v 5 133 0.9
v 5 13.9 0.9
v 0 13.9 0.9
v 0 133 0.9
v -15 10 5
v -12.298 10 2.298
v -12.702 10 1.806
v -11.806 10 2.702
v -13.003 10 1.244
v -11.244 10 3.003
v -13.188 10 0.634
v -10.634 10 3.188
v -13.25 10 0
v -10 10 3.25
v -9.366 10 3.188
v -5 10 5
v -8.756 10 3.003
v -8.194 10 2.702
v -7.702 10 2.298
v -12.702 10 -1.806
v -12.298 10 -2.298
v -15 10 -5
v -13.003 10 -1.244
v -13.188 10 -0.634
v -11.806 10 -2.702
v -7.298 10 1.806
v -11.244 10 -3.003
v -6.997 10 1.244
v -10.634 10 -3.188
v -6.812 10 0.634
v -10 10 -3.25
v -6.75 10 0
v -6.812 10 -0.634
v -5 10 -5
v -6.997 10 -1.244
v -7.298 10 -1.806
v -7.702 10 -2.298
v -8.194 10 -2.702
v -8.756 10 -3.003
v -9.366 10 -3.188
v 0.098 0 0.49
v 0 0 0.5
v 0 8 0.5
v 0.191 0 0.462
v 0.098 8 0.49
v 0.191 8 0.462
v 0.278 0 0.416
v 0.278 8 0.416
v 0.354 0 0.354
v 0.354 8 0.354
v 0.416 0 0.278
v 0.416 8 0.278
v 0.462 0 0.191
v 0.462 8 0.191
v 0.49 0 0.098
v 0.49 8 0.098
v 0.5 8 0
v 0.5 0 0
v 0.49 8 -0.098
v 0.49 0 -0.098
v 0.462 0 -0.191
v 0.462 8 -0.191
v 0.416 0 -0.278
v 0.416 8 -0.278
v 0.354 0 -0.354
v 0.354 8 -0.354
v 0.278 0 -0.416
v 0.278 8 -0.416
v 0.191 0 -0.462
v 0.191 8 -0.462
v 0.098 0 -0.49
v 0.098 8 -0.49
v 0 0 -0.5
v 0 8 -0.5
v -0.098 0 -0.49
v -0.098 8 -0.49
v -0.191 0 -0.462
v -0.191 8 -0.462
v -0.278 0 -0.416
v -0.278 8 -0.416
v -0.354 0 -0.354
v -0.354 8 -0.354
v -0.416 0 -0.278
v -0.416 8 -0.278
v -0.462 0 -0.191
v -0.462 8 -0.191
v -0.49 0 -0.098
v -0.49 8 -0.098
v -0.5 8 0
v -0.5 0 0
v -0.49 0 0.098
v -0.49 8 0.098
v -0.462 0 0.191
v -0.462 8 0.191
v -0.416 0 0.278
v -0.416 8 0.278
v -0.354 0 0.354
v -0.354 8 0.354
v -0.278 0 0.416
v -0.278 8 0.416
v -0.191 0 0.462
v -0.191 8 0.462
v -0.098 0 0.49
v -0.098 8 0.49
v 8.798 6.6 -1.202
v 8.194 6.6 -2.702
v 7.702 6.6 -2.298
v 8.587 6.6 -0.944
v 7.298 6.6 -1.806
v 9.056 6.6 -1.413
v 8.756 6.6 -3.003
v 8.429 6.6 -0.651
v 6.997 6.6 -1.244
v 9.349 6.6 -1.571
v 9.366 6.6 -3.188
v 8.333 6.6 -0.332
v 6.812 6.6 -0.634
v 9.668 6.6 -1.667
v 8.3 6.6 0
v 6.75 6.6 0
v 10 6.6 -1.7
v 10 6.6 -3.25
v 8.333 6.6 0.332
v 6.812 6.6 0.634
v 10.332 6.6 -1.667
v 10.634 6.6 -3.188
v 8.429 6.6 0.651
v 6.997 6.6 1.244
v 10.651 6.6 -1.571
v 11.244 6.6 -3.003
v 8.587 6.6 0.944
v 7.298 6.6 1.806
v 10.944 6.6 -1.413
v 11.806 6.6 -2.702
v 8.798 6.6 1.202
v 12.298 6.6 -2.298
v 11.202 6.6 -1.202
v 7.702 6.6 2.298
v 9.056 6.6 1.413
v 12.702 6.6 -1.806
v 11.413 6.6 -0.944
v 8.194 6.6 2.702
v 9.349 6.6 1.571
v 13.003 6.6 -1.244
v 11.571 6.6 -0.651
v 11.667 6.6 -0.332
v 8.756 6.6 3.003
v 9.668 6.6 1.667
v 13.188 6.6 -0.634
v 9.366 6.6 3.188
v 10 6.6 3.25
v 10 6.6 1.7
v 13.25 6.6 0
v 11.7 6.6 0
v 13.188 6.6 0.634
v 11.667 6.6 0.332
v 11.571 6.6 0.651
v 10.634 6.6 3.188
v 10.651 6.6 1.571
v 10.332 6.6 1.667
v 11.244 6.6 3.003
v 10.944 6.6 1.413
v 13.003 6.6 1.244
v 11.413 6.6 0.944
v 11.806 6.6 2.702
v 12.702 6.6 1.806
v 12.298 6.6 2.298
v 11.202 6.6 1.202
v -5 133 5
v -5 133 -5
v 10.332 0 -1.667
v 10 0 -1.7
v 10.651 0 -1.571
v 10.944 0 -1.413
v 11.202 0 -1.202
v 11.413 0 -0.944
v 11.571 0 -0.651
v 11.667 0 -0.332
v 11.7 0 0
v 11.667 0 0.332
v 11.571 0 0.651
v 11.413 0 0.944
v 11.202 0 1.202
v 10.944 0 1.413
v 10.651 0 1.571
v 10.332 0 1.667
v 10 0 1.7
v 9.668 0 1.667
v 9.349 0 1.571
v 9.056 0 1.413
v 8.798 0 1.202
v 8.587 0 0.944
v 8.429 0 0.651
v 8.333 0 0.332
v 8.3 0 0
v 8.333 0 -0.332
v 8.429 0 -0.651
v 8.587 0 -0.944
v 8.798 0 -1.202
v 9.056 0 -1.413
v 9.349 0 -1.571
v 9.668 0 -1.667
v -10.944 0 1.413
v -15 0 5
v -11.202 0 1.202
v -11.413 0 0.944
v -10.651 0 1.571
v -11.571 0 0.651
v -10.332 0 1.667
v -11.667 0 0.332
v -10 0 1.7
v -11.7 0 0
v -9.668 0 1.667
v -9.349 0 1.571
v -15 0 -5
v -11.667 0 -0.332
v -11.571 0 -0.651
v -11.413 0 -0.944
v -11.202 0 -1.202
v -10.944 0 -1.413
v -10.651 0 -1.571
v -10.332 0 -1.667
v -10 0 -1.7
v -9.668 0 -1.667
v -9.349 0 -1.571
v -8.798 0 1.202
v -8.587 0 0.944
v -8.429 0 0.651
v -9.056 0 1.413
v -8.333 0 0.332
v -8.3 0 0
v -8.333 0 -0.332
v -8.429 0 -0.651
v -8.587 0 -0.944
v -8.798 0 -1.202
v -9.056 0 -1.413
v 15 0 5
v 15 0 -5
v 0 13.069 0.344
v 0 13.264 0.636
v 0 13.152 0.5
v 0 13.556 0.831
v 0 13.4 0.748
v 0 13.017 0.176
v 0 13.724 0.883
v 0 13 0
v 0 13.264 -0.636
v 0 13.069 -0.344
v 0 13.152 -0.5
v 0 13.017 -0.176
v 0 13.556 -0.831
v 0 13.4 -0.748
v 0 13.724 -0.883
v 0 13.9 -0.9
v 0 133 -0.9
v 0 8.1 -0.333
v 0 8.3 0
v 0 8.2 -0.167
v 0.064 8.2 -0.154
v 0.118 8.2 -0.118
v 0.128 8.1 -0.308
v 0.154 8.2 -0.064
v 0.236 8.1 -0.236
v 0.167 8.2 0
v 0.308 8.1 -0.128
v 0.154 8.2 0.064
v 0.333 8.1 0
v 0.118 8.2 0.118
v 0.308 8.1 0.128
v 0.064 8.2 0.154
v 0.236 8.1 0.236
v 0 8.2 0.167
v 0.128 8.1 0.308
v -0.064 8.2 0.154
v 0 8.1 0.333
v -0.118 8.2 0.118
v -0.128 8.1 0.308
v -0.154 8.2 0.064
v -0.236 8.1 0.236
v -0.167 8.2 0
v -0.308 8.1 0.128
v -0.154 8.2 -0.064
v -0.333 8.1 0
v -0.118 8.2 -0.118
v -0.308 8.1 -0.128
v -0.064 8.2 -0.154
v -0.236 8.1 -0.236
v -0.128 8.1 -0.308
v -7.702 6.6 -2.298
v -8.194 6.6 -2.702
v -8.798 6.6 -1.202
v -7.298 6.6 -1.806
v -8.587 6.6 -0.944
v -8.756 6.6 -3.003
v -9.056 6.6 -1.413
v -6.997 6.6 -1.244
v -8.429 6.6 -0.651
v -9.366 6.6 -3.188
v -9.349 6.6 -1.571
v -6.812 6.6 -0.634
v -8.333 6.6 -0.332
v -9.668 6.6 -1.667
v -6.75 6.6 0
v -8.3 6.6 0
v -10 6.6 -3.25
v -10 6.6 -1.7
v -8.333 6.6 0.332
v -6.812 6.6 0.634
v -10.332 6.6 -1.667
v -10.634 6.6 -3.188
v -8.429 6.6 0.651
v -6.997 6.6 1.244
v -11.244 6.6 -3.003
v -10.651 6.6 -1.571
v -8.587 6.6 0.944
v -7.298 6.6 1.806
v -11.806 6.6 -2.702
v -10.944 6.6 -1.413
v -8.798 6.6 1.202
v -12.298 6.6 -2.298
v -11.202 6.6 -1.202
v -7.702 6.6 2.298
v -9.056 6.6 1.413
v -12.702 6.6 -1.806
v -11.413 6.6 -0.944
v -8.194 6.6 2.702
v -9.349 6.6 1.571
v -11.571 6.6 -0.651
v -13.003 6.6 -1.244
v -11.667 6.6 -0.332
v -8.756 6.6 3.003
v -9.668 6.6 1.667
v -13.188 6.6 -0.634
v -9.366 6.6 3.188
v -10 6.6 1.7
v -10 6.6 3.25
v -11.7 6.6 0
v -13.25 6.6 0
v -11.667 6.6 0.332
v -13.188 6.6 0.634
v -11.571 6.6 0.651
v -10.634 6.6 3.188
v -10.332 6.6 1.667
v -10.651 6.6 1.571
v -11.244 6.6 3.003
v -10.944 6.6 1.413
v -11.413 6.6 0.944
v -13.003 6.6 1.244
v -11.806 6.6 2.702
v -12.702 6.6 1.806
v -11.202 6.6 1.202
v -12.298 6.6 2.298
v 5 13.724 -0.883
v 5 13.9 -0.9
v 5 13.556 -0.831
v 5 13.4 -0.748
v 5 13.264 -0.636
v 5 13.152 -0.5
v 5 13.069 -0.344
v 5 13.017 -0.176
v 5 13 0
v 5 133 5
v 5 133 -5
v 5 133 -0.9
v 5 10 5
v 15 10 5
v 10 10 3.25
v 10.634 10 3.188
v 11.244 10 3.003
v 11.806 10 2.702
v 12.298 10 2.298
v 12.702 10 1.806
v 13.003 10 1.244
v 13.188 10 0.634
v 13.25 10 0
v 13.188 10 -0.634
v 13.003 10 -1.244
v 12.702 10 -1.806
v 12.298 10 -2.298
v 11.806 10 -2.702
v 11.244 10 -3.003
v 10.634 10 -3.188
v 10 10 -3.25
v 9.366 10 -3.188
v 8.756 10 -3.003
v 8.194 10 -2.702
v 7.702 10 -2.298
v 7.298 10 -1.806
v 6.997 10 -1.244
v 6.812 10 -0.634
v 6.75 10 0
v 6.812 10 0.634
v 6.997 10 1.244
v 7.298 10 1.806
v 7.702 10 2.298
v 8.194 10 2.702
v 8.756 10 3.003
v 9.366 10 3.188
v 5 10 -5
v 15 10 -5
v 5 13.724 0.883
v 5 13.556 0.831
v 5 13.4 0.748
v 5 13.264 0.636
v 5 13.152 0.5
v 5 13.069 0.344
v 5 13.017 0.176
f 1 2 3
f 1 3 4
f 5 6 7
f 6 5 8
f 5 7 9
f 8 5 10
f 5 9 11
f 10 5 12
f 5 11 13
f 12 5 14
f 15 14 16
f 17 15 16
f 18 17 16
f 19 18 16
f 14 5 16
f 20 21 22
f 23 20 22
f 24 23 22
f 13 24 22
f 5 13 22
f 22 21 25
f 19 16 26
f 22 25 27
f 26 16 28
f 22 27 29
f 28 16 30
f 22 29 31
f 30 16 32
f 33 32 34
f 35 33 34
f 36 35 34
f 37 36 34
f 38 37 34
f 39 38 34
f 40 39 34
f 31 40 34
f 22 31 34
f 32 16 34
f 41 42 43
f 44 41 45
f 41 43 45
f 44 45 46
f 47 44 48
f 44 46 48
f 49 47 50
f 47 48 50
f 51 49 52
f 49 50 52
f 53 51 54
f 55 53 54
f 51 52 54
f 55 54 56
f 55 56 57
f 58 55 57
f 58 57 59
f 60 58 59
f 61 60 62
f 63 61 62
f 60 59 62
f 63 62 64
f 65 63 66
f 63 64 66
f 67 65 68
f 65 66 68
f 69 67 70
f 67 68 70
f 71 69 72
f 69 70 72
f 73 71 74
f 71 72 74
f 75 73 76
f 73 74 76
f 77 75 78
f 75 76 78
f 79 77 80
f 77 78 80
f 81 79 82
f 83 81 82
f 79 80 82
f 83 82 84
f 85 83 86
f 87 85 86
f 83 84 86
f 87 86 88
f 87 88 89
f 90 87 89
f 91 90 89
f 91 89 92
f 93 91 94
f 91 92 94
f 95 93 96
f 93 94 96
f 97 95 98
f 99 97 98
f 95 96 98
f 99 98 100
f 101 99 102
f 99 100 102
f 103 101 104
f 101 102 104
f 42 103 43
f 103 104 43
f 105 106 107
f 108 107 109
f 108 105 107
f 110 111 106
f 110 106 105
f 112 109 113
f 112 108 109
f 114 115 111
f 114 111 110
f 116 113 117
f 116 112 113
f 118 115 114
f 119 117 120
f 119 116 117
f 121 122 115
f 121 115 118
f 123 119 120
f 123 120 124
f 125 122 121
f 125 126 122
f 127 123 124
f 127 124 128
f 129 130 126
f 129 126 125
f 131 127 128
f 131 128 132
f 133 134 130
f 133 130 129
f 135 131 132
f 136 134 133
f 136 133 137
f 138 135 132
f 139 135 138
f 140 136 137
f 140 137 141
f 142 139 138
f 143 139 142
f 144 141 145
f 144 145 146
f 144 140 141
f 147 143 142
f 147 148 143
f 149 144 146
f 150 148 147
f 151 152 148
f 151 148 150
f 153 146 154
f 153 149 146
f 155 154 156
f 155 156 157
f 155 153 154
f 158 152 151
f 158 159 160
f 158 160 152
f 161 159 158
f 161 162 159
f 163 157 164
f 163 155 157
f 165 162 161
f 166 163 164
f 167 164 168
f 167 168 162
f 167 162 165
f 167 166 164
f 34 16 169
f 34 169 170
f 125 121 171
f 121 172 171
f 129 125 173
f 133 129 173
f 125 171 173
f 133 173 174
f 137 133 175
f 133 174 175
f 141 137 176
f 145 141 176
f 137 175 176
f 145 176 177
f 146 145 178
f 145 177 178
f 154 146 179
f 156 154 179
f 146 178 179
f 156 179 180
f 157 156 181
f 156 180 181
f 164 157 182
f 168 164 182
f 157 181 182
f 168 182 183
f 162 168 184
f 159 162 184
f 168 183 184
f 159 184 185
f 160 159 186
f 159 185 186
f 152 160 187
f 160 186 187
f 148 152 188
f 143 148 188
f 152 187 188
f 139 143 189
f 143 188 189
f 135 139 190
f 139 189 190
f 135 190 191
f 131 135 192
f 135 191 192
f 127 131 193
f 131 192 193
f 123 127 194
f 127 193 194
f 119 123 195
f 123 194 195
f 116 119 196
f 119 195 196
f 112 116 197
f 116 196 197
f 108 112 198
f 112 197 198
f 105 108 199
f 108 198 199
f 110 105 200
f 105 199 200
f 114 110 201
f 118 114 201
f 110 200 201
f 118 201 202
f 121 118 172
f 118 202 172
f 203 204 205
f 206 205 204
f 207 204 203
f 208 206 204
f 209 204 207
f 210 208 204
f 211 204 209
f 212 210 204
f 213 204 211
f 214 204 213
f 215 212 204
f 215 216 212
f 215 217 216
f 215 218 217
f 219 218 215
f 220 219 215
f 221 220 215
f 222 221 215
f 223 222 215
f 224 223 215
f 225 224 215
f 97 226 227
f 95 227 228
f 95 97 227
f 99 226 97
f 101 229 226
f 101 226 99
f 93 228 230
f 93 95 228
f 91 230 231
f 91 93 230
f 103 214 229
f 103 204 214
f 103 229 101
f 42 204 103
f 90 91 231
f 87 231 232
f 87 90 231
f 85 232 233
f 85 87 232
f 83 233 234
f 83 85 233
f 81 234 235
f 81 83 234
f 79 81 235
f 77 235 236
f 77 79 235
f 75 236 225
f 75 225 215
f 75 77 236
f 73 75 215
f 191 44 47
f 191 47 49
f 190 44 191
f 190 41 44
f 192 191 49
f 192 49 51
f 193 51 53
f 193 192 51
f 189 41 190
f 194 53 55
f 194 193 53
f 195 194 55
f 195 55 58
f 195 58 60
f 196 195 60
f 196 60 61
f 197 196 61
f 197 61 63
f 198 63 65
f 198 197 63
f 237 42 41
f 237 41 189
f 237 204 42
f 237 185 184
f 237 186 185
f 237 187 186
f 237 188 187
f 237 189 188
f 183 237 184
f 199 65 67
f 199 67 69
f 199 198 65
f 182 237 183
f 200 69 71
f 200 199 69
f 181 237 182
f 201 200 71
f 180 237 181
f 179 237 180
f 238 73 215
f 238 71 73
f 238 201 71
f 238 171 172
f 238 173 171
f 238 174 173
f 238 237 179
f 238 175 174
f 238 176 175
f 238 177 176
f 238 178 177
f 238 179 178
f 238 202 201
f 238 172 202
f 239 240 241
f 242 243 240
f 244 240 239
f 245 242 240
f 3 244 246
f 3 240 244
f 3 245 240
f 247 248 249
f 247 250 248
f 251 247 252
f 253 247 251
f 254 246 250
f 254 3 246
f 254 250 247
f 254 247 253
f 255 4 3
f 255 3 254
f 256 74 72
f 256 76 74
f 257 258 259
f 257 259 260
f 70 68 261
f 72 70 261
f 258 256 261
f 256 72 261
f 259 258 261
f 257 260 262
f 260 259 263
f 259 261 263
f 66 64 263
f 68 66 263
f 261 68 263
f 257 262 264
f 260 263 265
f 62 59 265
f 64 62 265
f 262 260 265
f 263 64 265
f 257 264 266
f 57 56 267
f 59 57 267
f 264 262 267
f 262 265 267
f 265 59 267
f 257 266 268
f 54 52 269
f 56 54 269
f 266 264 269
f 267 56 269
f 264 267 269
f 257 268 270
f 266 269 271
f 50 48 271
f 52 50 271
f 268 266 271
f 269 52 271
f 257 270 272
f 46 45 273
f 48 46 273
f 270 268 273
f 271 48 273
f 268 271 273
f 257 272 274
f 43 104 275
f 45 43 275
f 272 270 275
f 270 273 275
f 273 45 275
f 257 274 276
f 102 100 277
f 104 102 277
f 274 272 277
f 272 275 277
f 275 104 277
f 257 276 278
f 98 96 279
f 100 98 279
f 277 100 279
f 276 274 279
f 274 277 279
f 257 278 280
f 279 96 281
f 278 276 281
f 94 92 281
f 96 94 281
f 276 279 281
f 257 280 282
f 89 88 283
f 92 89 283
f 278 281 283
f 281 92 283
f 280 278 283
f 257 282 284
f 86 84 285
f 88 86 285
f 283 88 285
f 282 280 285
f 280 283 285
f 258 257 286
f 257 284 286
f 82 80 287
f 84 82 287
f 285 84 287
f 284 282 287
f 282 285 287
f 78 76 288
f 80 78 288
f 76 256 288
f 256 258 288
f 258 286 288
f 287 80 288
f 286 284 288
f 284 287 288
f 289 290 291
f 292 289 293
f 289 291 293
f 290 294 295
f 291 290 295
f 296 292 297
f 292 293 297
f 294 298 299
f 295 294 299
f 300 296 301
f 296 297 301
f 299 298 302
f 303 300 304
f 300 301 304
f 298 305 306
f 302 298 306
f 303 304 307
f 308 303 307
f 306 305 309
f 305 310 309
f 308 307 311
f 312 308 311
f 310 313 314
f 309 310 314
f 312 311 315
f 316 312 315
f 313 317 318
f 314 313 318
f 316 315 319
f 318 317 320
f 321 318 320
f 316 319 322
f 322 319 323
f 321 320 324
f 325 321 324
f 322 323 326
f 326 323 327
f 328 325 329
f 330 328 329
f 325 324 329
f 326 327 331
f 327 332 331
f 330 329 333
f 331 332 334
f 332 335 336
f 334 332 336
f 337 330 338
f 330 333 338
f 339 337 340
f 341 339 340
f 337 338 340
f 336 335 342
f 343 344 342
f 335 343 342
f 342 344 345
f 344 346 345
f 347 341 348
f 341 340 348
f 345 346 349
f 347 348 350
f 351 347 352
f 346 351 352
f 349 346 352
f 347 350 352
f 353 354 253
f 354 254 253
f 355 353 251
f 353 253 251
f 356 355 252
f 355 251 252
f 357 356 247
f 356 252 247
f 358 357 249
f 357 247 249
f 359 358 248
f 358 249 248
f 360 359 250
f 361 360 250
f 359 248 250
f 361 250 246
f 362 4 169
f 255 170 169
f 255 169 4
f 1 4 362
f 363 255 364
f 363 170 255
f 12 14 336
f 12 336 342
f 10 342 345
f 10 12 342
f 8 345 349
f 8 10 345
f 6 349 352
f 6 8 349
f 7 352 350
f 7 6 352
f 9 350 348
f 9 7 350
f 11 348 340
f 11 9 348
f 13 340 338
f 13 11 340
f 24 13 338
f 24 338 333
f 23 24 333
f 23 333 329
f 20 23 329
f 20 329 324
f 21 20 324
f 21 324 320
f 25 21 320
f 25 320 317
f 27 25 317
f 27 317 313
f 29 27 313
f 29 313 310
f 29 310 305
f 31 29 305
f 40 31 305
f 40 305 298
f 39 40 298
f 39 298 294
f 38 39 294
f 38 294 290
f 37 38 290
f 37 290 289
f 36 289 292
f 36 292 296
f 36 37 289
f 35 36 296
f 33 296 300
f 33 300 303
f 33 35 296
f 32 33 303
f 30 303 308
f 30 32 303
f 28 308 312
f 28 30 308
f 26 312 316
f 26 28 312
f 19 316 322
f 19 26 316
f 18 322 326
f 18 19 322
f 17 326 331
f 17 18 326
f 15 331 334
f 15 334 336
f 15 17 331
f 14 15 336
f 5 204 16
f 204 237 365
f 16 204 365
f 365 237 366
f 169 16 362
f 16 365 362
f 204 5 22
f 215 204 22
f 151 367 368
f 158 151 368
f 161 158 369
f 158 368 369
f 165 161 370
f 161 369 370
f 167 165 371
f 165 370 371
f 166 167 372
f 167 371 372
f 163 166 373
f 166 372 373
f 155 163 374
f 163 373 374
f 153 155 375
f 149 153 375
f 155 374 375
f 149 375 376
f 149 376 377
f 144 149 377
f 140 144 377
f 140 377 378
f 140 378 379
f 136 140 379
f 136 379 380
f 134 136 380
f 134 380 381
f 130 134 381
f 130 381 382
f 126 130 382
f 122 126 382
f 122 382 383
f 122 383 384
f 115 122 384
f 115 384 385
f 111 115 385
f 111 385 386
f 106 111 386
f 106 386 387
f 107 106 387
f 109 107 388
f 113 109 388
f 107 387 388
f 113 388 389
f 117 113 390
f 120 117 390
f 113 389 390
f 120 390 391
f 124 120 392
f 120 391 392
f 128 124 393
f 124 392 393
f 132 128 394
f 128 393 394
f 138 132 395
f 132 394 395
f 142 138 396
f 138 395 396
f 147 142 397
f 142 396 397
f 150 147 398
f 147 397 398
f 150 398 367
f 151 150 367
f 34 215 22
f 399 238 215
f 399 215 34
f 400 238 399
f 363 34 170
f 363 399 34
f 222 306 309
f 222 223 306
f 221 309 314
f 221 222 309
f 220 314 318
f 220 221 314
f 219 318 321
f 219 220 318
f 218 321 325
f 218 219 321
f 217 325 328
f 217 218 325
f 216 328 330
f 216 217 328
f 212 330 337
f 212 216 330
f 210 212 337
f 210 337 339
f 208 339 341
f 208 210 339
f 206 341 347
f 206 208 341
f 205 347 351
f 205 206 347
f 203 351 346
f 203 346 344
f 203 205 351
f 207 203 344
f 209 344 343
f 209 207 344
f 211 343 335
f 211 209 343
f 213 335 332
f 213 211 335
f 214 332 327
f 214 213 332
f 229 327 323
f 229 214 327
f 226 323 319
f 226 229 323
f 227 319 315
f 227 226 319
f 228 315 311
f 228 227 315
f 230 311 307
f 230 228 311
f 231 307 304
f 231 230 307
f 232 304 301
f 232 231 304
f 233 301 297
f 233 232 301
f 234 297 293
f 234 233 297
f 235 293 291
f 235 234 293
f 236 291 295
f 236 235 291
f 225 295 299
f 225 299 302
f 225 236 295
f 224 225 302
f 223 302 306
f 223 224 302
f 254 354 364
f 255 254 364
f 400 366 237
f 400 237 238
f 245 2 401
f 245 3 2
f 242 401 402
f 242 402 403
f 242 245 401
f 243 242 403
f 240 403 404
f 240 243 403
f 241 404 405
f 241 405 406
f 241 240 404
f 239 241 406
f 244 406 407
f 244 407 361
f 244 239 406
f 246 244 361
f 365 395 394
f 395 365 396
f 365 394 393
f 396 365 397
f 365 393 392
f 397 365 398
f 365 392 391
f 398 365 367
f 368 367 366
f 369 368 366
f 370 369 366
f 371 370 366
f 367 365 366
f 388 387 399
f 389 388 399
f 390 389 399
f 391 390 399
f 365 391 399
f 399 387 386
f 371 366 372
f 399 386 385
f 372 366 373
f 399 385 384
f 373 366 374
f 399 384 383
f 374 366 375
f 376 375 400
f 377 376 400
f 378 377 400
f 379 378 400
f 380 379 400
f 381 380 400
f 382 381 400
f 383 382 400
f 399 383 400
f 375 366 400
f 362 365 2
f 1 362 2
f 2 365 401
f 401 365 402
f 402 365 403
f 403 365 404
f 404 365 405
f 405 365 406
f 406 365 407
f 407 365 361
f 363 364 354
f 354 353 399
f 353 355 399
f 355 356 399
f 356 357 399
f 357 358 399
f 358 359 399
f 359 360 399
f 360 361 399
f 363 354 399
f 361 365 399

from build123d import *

# Parameters (mm, degrees)
SKETCH1_W                                           = 10
SKETCH1_H                                           = 10
BOSS_EXTRUDE1_DEPTH                                 = 133
SKETCH3_W                                           = 1.8
SKETCH3_H                                           = 120
CUT_EXTRUDE1_DEPTH                                  = 5
FILLET1_R                                           = 0.9
SKETCH4_W                                           = 10
SKETCH4_H                                           = 10
BOSS_EXTRUDE3_DEPTH                                 = 15
CBORE_FOR_M3_HEX_SOCKET_HEAD_CAP_SCREW1_D           = 3.4
CBORE_FOR_M3_HEX_SOCKET_HEAD_CAP_SCREW1_CBORE_D     = 6.5
CBORE_FOR_M3_HEX_SOCKET_HEAD_CAP_SCREW1_CBORE_DEPTH = 3.4
F_1_0MM_DOWEL_HOLE1_D                               = 1
F_1_0MM_DOWEL_HOLE1_DEPTH                           = 8
F_1_0MM_DOWEL_HOLE1_TIP                             = 0.30043031


with BuildPart() as part:
    # Sketch1 → Boss-Extrude1 (new body)
    with BuildSketch(Plane(origin=(0, 0, 0), x_dir=(1, 0, 0), z_dir=(0, 1, 0))):
        Rectangle(SKETCH1_W, SKETCH1_H)
    extrude(amount=BOSS_EXTRUDE1_DEPTH)

    # Sketch3 → Cut-Extrude1 (cut)
    with BuildSketch(Plane(origin=(5, 0, 0), x_dir=(0, 0, -1), z_dir=(1, 0, 0))):
        with Locations((0, 73)):
            Rectangle(SKETCH3_W, SKETCH3_H)
    extrude(amount=-CUT_EXTRUDE1_DEPTH, mode=Mode.SUBTRACT)

    # Fillet1
    fillet1_edges = [part.edges().sort_by_distance(p)[0] for p in [
        (2.5, 13, 0.9),
        (2.5, 13, -0.9),
    ]]
    fillet(fillet1_edges, radius=FILLET1_R - 0.0001)  # a hair under: the kernel refuses the full size

    # Sketch4 → Boss-Extrude3 (add, symmetric)
    with BuildSketch(Plane(origin=(0, 0, 0), x_dir=(0, 0, -1), z_dir=(1, 0, 0))):
        with Locations((0, 5)):
            Rectangle(SKETCH4_W, SKETCH4_H)
    extrude(amount=BOSS_EXTRUDE3_DEPTH, both=True)

    # CBORE for M3 Hex Socket Head Cap Screw1 (through all)
    with Locations(Plane(origin=(10, 10, 0), x_dir=(0, 0, 1), z_dir=(0, 1, 0))):
        with Locations((0, 0)):
            cbore_for_m3_hex_socket_head_cap_screw1 = CounterBoreHole(CBORE_FOR_M3_HEX_SOCKET_HEAD_CAP_SCREW1_D / 2, CBORE_FOR_M3_HEX_SOCKET_HEAD_CAP_SCREW1_CBORE_D / 2, CBORE_FOR_M3_HEX_SOCKET_HEAD_CAP_SCREW1_CBORE_DEPTH)

    # Mirror1: CBORE for M3 Hex Socket Head Cap Screw1 across plane
    add(cbore_for_m3_hex_socket_head_cap_screw1.mirror(Plane(origin=(0, 0, 0), x_dir=(0, 0, 1), z_dir=(1, 0, 0))), mode=Mode.SUBTRACT)

    # Ø1.0mm Dowel Hole1
    with Locations(Plane(origin=(0, 0, 0), x_dir=(0, 0, -1), z_dir=(0, -1, 0))):
        with Locations((0, 0)):
            Hole(F_1_0MM_DOWEL_HOLE1_D / 2, depth=F_1_0MM_DOWEL_HOLE1_DEPTH)
            with Locations((0, 0, -(F_1_0MM_DOWEL_HOLE1_DEPTH + F_1_0MM_DOWEL_HOLE1_TIP / 2))):  # 118° drill point
                Cone(0, F_1_0MM_DOWEL_HOLE1_D / 2, F_1_0MM_DOWEL_HOLE1_TIP, mode=Mode.SUBTRACT)


solid = part.part
